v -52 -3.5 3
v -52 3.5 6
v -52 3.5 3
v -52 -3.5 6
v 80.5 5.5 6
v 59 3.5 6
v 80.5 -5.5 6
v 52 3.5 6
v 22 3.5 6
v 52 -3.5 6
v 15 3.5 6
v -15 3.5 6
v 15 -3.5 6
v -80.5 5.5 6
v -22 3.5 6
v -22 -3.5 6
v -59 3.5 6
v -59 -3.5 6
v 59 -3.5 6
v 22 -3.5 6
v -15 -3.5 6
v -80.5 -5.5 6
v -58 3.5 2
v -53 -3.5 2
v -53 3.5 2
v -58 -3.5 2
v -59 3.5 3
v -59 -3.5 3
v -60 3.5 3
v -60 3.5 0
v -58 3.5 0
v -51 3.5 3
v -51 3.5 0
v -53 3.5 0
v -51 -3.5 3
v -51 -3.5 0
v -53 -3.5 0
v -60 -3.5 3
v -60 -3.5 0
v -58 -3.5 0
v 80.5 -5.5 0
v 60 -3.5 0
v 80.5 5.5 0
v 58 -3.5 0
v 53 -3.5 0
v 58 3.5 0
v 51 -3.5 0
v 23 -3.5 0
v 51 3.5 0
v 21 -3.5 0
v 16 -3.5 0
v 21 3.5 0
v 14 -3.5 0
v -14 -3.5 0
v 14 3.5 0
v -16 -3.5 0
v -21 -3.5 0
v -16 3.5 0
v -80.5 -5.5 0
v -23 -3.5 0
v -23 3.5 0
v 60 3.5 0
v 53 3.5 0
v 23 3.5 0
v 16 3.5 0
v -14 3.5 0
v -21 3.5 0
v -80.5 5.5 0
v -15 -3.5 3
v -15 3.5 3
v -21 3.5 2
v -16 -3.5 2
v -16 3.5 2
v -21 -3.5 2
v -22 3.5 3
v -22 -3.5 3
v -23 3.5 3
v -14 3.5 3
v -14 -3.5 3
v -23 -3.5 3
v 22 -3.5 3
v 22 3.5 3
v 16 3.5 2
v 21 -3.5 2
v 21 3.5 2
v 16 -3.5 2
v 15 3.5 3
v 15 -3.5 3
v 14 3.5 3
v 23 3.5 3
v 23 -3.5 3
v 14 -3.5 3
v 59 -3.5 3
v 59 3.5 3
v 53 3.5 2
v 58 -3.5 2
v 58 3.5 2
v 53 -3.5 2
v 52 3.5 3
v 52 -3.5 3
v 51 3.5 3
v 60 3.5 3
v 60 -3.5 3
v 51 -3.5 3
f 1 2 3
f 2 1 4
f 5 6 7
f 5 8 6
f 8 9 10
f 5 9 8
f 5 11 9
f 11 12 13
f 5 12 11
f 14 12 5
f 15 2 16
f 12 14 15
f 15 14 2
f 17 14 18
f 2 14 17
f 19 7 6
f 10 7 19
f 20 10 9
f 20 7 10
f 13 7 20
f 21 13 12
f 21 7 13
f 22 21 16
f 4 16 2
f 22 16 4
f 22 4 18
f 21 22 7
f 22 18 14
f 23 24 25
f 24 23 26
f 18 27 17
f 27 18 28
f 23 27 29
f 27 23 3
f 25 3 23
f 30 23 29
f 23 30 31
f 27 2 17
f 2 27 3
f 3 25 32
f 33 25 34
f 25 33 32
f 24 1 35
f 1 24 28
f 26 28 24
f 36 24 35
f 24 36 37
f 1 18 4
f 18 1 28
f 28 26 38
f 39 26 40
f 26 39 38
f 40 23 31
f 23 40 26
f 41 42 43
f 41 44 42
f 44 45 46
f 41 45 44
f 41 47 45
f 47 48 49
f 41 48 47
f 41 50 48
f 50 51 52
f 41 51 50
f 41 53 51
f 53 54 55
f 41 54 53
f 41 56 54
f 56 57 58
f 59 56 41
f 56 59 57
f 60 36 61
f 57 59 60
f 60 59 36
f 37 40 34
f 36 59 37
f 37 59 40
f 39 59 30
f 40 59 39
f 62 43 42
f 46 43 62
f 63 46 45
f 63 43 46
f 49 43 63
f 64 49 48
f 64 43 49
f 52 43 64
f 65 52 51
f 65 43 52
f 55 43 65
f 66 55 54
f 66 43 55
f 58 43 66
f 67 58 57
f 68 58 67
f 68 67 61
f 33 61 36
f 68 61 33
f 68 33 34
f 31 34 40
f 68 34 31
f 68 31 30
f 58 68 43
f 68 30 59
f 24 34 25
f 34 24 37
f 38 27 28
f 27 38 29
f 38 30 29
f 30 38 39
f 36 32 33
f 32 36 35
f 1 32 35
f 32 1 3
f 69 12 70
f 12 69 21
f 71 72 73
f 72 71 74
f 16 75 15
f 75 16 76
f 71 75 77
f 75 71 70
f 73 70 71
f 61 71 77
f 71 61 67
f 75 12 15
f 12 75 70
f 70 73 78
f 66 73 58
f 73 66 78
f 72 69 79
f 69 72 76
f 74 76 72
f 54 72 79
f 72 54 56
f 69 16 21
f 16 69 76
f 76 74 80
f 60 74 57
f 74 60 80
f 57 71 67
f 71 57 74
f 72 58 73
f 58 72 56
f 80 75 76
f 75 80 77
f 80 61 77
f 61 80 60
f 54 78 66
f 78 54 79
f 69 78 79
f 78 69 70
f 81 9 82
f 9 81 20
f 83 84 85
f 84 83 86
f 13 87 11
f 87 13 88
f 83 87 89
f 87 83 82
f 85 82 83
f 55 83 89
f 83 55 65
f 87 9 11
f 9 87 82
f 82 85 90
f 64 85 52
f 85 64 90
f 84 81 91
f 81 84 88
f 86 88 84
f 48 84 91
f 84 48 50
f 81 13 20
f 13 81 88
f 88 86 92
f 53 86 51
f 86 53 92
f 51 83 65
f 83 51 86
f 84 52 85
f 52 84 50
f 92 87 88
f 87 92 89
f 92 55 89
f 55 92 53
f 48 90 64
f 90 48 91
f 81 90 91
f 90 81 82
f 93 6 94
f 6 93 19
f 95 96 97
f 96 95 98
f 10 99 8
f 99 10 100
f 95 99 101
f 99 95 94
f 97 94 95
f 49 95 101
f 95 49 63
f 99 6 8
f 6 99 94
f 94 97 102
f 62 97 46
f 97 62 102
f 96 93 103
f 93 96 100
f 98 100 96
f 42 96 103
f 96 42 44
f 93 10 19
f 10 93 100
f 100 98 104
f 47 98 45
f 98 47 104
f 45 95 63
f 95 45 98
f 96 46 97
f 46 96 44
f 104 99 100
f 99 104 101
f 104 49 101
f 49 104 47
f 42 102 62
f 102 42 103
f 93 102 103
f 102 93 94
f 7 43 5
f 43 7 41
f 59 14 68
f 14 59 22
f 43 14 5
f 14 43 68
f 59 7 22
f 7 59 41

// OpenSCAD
module hole() {
    translate([-7/2,0,0]) {
        translate([0, 0, 2]) cube([7,7,4]);
        translate([0, 0, 0]) cube([1, 7, 6]);
        translate([6, 0, 0]) cube([1, 7, 6]);
        translate([-1, 0, 0]) cube([1, 7, 3]);
        translate([7, 0, 0]) cube([1, 7, 3]);
    }
}
module buttonHolder() {
    translate([-(25*2+37*3)/2,-(2*2+7)/2,0]) difference() {
        cube([25*2+37*3,2*2+7,6]);
        for (i = [ 0 : 1 : 3]) {
            translate([25+37*i,2,0]) hole();
        }
    }
}

buttonHolder();
